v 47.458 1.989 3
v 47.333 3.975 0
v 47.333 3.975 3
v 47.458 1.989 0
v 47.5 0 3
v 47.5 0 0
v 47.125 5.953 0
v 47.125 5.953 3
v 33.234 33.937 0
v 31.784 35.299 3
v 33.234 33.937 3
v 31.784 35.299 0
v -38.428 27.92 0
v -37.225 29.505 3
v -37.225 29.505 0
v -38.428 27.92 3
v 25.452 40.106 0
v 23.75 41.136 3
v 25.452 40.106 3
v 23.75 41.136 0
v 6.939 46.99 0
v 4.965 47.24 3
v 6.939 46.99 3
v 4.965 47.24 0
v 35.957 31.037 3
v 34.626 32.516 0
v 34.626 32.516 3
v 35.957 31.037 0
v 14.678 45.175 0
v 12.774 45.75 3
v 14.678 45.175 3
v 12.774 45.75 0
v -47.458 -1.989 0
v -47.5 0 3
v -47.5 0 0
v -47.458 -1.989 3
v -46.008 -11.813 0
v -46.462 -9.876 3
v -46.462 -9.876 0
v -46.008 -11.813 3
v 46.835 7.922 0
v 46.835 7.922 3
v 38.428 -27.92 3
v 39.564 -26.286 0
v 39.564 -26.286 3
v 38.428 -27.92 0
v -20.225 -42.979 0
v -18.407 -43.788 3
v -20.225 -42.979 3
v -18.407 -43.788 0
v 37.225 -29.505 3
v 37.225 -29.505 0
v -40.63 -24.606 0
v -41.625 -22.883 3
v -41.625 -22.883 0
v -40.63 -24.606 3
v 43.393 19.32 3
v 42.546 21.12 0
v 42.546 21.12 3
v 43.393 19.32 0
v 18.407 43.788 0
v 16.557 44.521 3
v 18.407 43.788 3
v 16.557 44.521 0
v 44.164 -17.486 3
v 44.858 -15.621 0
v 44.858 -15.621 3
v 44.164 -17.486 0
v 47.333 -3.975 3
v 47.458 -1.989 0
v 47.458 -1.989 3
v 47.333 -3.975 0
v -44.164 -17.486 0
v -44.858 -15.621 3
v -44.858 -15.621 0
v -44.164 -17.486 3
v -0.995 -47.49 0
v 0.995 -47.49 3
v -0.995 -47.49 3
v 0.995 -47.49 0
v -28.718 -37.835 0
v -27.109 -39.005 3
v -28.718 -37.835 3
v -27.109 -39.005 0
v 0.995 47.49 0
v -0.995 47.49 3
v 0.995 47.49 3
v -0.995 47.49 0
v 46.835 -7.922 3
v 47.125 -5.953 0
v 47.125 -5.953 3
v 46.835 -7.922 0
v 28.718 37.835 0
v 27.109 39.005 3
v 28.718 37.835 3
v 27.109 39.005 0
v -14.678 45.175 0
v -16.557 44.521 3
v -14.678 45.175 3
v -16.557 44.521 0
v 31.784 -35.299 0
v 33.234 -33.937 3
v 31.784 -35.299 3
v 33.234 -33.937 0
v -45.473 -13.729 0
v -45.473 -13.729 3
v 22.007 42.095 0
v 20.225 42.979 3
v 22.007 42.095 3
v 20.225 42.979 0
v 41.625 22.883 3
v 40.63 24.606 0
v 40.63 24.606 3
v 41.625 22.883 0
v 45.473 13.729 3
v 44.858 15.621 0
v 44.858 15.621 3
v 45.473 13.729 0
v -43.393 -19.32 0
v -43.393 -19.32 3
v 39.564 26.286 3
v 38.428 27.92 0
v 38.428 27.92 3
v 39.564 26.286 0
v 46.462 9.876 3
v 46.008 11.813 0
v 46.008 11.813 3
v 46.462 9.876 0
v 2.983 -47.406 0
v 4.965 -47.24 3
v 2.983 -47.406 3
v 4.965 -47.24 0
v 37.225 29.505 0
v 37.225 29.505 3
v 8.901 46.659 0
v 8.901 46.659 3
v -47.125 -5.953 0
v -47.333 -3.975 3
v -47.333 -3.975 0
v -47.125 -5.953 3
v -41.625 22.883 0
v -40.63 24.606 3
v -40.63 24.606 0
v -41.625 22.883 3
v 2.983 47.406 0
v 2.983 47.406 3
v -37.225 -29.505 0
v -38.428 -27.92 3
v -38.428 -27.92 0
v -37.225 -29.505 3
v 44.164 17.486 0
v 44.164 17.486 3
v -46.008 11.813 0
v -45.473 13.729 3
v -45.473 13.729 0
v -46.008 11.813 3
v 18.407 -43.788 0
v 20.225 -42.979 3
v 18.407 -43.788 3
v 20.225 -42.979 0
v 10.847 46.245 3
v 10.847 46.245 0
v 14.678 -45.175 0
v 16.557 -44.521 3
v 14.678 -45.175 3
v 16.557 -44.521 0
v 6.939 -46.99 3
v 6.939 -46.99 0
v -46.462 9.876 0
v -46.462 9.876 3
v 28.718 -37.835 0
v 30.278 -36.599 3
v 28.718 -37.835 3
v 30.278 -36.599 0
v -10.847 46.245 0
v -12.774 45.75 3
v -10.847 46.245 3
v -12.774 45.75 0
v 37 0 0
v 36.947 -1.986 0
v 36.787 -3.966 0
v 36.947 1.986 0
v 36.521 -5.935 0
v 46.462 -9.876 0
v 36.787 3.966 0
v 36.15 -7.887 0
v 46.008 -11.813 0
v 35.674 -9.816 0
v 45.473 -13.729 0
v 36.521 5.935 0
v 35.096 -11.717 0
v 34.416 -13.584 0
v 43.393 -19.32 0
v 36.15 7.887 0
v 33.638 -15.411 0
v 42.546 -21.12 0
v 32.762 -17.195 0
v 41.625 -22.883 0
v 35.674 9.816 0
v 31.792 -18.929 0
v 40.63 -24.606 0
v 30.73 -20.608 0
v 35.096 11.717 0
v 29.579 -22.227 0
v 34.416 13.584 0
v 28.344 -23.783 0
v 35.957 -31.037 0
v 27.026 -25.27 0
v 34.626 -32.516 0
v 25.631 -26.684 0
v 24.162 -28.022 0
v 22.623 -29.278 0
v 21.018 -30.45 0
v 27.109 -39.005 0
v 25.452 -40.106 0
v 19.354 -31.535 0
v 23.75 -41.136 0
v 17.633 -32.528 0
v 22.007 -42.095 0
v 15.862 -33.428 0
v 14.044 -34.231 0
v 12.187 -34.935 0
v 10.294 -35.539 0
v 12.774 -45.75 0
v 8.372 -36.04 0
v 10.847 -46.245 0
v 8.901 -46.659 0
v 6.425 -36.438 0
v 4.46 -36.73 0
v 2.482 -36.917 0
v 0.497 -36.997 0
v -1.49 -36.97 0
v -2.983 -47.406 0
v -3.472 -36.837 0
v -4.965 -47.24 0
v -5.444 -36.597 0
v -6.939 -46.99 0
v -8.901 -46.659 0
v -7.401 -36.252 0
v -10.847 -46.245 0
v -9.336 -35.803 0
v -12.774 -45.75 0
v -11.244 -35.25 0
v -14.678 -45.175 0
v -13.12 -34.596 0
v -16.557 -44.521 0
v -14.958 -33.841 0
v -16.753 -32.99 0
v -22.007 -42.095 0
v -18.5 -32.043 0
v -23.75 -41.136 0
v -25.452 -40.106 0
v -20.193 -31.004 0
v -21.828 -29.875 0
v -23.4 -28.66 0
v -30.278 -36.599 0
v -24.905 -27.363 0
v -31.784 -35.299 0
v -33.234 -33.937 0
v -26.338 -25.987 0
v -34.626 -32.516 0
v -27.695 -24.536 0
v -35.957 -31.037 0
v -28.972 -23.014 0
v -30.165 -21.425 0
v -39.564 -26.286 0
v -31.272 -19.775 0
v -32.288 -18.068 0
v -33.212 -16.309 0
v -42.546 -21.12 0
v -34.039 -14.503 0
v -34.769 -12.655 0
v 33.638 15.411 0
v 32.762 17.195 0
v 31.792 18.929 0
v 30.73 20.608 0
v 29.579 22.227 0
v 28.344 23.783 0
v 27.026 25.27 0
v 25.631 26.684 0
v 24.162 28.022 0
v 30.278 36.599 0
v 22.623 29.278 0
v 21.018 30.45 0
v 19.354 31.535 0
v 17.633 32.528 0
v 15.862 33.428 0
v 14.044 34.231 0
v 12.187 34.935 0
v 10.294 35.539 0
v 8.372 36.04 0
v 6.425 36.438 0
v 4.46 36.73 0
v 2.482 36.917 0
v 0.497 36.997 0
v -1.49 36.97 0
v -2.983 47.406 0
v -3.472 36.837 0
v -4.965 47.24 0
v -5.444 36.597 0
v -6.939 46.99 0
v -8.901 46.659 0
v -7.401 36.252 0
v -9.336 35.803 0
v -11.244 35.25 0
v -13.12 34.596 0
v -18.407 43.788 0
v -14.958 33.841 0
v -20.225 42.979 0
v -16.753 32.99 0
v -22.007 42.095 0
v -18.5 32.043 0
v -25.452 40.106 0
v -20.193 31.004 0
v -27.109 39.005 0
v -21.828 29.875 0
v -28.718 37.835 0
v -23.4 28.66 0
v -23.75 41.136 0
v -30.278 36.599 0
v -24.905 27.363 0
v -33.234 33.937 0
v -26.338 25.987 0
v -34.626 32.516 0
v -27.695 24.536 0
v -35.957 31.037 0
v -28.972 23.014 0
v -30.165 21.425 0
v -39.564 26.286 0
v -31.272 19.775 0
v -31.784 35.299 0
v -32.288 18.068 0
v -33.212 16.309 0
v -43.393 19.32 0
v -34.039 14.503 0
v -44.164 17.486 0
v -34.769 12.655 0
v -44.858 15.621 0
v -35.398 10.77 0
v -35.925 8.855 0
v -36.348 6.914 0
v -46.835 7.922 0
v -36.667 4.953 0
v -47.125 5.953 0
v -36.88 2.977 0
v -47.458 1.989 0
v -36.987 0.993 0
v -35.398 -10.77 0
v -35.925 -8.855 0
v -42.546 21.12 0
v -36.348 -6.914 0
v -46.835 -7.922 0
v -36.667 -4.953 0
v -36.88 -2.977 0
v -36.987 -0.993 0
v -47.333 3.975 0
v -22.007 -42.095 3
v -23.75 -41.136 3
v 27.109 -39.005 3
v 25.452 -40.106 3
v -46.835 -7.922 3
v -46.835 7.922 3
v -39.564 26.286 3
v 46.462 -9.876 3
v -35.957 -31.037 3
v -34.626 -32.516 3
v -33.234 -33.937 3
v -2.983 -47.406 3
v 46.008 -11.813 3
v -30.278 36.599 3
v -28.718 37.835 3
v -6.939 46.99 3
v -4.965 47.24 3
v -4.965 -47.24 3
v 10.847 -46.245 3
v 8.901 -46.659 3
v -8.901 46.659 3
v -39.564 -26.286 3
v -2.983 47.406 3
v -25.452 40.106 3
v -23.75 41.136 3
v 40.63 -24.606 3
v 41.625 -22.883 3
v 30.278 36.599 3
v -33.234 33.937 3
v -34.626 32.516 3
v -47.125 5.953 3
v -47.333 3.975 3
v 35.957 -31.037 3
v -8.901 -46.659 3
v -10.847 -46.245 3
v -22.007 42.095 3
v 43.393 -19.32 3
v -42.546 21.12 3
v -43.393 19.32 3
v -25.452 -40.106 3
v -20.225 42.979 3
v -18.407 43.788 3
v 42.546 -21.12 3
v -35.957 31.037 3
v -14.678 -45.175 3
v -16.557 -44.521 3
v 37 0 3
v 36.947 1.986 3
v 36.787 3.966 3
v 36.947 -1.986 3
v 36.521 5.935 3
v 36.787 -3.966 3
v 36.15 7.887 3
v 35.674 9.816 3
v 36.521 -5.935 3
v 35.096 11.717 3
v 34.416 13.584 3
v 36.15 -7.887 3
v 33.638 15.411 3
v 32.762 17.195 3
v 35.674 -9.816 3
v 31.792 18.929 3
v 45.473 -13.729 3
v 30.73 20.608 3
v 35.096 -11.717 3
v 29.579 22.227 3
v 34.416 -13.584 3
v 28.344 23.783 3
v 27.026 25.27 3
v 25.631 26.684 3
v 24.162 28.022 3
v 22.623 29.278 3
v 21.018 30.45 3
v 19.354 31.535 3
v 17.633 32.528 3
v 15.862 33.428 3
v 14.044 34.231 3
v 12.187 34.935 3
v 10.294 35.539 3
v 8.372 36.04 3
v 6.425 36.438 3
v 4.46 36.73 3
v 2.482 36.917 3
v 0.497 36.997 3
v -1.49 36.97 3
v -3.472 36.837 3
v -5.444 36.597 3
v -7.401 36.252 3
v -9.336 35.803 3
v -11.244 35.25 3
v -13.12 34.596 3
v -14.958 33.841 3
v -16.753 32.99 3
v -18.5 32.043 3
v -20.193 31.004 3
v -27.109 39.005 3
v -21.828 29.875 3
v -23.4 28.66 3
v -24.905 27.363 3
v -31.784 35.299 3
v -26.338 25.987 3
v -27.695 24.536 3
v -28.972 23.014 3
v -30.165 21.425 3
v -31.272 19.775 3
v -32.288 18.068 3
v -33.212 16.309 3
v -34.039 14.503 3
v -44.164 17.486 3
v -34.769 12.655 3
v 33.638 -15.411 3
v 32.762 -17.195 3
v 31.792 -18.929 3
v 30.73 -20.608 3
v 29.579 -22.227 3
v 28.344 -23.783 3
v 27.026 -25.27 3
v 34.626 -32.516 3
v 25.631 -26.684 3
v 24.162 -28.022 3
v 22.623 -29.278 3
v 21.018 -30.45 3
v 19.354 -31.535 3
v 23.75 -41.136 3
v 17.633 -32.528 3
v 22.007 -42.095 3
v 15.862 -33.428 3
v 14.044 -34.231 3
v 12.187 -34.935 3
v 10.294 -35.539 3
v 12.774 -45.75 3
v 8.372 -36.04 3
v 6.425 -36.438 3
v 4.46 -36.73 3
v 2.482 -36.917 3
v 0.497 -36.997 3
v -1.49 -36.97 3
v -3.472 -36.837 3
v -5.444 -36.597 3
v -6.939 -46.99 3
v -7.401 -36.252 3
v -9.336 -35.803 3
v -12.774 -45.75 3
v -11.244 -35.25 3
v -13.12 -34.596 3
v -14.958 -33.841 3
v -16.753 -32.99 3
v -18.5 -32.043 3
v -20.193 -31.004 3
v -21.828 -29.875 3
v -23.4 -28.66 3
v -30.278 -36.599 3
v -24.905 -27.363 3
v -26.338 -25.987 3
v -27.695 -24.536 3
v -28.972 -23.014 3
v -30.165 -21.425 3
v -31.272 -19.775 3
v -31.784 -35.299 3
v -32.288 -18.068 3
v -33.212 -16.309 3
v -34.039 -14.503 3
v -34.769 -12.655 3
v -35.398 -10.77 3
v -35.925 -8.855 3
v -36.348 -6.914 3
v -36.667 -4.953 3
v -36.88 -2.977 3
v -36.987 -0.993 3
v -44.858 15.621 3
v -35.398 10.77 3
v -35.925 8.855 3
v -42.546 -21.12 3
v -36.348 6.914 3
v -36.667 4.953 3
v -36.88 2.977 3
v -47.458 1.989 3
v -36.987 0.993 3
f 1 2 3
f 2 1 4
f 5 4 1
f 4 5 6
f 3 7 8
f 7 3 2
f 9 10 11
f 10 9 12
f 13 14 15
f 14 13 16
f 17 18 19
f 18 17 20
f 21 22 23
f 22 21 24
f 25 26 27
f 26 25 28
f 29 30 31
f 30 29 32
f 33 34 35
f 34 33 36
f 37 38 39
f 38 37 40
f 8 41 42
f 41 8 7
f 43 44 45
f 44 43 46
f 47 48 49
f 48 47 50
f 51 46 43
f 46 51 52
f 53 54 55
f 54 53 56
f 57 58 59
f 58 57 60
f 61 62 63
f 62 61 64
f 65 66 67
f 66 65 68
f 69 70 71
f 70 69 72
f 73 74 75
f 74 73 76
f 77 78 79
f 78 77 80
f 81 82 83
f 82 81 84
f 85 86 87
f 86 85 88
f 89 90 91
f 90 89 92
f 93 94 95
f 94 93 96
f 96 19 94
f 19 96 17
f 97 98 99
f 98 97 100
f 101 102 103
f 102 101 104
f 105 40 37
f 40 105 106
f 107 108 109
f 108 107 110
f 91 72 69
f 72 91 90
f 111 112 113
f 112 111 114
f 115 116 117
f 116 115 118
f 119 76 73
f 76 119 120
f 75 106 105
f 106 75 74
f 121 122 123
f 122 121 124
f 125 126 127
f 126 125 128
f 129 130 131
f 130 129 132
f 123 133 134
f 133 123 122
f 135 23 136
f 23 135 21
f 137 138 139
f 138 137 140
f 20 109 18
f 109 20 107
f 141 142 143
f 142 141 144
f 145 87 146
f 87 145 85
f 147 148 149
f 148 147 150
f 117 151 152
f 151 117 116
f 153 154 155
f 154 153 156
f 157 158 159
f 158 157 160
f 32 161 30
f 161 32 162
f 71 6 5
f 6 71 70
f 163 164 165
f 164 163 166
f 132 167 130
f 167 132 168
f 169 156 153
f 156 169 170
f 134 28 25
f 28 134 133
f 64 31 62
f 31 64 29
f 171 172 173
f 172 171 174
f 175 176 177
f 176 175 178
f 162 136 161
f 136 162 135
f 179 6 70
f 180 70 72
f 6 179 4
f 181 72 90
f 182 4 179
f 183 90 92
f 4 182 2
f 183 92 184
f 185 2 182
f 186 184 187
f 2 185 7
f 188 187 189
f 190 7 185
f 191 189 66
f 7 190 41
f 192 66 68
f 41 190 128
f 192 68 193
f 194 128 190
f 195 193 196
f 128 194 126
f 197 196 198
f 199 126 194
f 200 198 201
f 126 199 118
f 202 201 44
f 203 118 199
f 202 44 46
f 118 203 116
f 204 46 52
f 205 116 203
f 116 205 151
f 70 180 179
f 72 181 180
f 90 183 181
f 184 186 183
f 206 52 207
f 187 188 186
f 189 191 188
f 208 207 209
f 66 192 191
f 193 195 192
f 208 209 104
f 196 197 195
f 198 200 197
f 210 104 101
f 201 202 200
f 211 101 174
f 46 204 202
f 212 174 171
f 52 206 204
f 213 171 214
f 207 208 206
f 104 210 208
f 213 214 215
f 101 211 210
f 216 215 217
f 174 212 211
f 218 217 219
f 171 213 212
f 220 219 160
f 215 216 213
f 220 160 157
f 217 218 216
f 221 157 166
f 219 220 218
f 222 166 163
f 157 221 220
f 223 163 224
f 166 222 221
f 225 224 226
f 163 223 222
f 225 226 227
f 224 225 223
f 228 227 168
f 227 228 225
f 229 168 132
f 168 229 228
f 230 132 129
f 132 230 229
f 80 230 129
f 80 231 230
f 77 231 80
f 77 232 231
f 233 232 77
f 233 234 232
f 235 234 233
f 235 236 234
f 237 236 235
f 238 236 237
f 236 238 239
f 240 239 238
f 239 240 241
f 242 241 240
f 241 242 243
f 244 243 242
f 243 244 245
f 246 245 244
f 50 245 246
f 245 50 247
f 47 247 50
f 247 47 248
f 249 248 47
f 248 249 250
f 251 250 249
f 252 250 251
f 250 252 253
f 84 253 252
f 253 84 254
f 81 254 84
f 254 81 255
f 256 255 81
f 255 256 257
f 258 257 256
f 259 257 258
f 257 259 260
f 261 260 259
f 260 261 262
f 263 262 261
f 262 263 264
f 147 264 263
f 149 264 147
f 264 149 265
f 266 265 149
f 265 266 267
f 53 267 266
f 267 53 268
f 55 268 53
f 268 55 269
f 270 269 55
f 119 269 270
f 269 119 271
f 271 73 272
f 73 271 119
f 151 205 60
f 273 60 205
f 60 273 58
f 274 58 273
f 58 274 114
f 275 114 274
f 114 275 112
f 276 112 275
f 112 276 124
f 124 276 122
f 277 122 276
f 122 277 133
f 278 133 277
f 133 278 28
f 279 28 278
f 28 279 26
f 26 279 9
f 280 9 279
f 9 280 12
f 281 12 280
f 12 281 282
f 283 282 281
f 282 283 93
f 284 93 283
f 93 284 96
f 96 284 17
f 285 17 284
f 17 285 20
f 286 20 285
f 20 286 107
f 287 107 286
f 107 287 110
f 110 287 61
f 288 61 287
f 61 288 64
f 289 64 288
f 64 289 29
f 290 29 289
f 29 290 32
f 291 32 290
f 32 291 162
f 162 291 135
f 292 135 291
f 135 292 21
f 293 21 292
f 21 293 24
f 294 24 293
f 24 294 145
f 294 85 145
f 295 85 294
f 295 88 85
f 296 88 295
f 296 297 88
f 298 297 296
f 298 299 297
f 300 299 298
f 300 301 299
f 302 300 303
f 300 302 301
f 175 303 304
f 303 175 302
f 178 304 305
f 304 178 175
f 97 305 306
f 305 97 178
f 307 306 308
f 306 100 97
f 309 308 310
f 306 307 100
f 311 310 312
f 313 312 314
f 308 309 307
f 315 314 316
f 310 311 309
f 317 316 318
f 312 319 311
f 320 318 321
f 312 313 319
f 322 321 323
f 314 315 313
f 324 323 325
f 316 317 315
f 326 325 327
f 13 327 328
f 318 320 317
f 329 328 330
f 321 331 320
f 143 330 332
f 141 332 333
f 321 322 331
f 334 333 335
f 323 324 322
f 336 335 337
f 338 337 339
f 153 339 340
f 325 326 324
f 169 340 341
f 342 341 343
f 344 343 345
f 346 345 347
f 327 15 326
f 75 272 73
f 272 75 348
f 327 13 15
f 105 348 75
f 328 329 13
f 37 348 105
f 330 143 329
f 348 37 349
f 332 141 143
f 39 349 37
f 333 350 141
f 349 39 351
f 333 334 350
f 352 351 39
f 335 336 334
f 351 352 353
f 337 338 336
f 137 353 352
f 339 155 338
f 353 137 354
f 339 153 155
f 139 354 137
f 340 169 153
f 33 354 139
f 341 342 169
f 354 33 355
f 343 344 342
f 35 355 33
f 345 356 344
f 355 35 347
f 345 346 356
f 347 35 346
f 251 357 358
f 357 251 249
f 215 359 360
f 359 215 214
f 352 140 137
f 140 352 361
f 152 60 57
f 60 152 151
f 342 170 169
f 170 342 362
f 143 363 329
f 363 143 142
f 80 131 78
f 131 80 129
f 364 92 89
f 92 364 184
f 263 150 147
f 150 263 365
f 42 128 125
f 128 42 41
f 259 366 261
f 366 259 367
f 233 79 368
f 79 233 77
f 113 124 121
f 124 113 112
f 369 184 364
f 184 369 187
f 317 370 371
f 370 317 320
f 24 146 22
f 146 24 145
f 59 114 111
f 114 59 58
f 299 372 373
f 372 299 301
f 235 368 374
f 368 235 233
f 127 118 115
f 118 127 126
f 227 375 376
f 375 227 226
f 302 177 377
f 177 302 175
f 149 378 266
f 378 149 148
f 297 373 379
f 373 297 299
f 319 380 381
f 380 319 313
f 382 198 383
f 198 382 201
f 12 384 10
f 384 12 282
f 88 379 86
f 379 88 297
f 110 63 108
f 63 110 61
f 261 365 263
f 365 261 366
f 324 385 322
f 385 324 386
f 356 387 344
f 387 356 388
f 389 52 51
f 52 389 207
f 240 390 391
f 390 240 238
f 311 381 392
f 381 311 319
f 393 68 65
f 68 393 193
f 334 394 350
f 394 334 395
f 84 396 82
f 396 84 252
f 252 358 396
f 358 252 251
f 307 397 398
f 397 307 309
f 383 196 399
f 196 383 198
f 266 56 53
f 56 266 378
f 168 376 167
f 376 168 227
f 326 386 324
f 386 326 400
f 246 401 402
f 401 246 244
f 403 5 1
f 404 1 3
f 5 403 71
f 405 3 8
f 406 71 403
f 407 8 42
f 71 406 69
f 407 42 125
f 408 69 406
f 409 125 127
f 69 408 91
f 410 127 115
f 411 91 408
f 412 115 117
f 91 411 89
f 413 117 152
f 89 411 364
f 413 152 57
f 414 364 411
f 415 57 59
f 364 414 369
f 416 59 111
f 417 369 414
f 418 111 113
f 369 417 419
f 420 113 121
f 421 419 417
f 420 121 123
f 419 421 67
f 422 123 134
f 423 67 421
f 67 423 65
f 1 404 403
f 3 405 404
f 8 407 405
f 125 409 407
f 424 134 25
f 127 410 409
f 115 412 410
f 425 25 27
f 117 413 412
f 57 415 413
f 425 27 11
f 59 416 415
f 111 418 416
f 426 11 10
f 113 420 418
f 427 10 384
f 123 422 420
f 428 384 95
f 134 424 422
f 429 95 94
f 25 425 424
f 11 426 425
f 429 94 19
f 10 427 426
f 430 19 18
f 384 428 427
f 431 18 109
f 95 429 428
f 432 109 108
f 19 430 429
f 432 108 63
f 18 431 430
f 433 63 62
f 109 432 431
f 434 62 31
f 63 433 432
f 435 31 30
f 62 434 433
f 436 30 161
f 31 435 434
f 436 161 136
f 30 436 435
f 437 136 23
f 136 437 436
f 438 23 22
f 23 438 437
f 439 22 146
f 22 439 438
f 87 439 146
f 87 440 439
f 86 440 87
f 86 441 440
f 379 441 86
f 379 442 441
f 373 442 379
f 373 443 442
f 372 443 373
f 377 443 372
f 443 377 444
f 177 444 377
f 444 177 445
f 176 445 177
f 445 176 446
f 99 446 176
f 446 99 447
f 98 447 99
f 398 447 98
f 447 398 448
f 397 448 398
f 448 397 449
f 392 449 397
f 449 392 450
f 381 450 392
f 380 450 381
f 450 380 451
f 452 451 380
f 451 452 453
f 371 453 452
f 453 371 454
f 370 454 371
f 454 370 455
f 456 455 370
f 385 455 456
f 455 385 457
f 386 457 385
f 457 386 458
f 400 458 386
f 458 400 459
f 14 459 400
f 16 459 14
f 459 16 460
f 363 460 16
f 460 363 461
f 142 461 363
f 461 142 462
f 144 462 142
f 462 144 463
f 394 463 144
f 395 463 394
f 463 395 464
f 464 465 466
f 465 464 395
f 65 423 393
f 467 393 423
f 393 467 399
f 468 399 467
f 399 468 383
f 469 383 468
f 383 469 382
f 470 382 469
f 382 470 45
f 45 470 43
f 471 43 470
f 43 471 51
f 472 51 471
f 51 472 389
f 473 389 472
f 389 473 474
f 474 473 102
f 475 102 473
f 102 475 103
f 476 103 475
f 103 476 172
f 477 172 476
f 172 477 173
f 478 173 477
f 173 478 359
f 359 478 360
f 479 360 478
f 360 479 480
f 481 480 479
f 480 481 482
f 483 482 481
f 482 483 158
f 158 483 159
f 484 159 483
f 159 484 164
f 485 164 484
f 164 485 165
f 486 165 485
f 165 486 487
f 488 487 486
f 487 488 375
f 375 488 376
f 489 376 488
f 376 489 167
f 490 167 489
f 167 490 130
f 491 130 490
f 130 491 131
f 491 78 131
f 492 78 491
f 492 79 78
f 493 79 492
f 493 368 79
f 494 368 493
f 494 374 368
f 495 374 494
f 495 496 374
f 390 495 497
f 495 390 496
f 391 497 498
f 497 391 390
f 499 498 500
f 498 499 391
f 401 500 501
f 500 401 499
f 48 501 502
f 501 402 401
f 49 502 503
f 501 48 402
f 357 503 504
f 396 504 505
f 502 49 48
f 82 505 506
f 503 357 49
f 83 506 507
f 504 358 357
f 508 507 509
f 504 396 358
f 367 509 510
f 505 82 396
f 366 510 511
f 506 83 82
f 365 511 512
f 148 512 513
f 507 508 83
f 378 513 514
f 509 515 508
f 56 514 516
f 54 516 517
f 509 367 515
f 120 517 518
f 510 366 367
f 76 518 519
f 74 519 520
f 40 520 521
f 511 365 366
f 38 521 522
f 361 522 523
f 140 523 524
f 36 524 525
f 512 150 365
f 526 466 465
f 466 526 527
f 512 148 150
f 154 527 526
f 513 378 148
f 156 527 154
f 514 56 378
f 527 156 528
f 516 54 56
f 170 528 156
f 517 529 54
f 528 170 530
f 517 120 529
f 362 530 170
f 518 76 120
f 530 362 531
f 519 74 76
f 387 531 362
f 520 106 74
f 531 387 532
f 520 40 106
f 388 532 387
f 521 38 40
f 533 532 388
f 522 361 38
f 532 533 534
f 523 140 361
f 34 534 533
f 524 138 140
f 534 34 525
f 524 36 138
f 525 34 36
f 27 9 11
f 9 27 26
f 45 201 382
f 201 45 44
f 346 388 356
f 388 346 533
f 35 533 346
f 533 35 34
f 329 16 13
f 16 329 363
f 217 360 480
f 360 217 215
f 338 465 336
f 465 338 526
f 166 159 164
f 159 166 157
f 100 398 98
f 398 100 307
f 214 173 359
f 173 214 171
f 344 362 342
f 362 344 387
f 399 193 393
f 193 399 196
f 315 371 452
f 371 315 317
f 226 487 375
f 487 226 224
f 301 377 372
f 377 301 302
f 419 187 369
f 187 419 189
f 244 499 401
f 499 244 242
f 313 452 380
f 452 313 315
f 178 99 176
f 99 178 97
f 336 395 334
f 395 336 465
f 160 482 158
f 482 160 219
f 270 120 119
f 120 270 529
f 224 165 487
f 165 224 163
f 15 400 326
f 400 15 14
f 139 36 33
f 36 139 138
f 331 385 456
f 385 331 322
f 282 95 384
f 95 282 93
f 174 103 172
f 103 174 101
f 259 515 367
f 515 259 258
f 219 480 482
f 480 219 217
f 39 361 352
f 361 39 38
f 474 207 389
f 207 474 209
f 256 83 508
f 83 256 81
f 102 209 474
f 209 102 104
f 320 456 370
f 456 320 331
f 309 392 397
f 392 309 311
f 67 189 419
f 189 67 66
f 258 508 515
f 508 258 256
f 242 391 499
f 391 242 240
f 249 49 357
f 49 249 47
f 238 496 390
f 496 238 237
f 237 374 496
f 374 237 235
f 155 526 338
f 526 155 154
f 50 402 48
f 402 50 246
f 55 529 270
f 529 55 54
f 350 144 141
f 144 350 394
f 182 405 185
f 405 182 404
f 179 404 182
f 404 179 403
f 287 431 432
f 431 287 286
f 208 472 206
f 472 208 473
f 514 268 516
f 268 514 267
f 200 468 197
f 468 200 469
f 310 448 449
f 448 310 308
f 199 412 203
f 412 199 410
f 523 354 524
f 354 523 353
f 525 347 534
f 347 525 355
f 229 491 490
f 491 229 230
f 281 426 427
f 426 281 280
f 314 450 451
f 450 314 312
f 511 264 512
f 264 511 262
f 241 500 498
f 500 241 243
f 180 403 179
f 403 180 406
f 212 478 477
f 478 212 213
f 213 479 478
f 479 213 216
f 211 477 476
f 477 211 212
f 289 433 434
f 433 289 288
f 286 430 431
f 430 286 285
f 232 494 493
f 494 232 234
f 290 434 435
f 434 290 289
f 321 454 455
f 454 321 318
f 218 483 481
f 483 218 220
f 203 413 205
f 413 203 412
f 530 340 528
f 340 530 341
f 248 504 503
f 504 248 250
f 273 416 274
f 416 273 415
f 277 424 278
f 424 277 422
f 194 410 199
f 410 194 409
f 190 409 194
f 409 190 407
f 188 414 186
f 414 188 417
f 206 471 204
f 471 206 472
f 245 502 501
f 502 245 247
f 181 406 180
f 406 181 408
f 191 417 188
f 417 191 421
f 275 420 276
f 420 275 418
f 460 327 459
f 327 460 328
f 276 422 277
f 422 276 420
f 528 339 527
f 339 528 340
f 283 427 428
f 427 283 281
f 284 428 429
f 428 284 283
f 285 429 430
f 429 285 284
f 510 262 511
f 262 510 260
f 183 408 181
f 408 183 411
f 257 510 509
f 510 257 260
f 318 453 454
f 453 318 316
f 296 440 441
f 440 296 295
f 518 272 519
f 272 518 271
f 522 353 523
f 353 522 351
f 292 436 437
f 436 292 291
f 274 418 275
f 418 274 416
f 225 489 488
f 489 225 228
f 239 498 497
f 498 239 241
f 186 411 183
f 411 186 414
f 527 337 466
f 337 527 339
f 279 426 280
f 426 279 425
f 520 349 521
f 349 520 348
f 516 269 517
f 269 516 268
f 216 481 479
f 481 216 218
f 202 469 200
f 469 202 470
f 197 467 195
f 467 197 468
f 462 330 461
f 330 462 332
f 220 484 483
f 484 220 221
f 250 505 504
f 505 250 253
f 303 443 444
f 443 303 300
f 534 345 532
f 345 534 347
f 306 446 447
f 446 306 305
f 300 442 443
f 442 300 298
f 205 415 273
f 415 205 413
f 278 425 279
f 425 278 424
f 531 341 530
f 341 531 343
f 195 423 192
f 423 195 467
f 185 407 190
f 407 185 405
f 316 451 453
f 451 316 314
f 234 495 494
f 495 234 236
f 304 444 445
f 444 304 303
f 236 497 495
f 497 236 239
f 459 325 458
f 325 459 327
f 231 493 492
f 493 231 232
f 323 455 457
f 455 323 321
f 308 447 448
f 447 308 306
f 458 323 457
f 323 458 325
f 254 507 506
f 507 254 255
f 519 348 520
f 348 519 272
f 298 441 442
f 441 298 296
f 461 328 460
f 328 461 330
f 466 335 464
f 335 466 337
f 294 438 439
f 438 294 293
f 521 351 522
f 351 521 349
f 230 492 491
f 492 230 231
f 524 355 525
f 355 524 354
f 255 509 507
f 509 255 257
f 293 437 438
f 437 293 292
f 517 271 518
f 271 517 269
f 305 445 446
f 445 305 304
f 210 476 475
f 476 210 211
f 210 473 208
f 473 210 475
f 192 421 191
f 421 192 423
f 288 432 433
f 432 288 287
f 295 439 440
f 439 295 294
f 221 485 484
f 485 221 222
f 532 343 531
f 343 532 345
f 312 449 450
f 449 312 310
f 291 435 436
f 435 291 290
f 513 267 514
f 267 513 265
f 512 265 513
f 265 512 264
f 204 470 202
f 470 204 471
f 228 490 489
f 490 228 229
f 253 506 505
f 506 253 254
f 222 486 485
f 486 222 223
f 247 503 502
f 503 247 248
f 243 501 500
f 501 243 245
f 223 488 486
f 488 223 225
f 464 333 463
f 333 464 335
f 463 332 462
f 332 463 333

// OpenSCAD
// Sealing (not just) for Ikea Korken
// https://www.thingiverse.com/thing:3724464
// Vilem Marsik, 2019
// CC BY-NC-SA
// https://creativecommons.org/licenses/by-nc-sa/4.0/


outer_diameter=95;
inner_diameter=74;
thickness=3;
/* [Hidden] */
$fa=.5;
difference()	{
	cylinder(d=outer_diameter,h=thickness);
	translate([0,0,-1])
		cylinder(d=inner_diameter,h=thickness+2);
}
